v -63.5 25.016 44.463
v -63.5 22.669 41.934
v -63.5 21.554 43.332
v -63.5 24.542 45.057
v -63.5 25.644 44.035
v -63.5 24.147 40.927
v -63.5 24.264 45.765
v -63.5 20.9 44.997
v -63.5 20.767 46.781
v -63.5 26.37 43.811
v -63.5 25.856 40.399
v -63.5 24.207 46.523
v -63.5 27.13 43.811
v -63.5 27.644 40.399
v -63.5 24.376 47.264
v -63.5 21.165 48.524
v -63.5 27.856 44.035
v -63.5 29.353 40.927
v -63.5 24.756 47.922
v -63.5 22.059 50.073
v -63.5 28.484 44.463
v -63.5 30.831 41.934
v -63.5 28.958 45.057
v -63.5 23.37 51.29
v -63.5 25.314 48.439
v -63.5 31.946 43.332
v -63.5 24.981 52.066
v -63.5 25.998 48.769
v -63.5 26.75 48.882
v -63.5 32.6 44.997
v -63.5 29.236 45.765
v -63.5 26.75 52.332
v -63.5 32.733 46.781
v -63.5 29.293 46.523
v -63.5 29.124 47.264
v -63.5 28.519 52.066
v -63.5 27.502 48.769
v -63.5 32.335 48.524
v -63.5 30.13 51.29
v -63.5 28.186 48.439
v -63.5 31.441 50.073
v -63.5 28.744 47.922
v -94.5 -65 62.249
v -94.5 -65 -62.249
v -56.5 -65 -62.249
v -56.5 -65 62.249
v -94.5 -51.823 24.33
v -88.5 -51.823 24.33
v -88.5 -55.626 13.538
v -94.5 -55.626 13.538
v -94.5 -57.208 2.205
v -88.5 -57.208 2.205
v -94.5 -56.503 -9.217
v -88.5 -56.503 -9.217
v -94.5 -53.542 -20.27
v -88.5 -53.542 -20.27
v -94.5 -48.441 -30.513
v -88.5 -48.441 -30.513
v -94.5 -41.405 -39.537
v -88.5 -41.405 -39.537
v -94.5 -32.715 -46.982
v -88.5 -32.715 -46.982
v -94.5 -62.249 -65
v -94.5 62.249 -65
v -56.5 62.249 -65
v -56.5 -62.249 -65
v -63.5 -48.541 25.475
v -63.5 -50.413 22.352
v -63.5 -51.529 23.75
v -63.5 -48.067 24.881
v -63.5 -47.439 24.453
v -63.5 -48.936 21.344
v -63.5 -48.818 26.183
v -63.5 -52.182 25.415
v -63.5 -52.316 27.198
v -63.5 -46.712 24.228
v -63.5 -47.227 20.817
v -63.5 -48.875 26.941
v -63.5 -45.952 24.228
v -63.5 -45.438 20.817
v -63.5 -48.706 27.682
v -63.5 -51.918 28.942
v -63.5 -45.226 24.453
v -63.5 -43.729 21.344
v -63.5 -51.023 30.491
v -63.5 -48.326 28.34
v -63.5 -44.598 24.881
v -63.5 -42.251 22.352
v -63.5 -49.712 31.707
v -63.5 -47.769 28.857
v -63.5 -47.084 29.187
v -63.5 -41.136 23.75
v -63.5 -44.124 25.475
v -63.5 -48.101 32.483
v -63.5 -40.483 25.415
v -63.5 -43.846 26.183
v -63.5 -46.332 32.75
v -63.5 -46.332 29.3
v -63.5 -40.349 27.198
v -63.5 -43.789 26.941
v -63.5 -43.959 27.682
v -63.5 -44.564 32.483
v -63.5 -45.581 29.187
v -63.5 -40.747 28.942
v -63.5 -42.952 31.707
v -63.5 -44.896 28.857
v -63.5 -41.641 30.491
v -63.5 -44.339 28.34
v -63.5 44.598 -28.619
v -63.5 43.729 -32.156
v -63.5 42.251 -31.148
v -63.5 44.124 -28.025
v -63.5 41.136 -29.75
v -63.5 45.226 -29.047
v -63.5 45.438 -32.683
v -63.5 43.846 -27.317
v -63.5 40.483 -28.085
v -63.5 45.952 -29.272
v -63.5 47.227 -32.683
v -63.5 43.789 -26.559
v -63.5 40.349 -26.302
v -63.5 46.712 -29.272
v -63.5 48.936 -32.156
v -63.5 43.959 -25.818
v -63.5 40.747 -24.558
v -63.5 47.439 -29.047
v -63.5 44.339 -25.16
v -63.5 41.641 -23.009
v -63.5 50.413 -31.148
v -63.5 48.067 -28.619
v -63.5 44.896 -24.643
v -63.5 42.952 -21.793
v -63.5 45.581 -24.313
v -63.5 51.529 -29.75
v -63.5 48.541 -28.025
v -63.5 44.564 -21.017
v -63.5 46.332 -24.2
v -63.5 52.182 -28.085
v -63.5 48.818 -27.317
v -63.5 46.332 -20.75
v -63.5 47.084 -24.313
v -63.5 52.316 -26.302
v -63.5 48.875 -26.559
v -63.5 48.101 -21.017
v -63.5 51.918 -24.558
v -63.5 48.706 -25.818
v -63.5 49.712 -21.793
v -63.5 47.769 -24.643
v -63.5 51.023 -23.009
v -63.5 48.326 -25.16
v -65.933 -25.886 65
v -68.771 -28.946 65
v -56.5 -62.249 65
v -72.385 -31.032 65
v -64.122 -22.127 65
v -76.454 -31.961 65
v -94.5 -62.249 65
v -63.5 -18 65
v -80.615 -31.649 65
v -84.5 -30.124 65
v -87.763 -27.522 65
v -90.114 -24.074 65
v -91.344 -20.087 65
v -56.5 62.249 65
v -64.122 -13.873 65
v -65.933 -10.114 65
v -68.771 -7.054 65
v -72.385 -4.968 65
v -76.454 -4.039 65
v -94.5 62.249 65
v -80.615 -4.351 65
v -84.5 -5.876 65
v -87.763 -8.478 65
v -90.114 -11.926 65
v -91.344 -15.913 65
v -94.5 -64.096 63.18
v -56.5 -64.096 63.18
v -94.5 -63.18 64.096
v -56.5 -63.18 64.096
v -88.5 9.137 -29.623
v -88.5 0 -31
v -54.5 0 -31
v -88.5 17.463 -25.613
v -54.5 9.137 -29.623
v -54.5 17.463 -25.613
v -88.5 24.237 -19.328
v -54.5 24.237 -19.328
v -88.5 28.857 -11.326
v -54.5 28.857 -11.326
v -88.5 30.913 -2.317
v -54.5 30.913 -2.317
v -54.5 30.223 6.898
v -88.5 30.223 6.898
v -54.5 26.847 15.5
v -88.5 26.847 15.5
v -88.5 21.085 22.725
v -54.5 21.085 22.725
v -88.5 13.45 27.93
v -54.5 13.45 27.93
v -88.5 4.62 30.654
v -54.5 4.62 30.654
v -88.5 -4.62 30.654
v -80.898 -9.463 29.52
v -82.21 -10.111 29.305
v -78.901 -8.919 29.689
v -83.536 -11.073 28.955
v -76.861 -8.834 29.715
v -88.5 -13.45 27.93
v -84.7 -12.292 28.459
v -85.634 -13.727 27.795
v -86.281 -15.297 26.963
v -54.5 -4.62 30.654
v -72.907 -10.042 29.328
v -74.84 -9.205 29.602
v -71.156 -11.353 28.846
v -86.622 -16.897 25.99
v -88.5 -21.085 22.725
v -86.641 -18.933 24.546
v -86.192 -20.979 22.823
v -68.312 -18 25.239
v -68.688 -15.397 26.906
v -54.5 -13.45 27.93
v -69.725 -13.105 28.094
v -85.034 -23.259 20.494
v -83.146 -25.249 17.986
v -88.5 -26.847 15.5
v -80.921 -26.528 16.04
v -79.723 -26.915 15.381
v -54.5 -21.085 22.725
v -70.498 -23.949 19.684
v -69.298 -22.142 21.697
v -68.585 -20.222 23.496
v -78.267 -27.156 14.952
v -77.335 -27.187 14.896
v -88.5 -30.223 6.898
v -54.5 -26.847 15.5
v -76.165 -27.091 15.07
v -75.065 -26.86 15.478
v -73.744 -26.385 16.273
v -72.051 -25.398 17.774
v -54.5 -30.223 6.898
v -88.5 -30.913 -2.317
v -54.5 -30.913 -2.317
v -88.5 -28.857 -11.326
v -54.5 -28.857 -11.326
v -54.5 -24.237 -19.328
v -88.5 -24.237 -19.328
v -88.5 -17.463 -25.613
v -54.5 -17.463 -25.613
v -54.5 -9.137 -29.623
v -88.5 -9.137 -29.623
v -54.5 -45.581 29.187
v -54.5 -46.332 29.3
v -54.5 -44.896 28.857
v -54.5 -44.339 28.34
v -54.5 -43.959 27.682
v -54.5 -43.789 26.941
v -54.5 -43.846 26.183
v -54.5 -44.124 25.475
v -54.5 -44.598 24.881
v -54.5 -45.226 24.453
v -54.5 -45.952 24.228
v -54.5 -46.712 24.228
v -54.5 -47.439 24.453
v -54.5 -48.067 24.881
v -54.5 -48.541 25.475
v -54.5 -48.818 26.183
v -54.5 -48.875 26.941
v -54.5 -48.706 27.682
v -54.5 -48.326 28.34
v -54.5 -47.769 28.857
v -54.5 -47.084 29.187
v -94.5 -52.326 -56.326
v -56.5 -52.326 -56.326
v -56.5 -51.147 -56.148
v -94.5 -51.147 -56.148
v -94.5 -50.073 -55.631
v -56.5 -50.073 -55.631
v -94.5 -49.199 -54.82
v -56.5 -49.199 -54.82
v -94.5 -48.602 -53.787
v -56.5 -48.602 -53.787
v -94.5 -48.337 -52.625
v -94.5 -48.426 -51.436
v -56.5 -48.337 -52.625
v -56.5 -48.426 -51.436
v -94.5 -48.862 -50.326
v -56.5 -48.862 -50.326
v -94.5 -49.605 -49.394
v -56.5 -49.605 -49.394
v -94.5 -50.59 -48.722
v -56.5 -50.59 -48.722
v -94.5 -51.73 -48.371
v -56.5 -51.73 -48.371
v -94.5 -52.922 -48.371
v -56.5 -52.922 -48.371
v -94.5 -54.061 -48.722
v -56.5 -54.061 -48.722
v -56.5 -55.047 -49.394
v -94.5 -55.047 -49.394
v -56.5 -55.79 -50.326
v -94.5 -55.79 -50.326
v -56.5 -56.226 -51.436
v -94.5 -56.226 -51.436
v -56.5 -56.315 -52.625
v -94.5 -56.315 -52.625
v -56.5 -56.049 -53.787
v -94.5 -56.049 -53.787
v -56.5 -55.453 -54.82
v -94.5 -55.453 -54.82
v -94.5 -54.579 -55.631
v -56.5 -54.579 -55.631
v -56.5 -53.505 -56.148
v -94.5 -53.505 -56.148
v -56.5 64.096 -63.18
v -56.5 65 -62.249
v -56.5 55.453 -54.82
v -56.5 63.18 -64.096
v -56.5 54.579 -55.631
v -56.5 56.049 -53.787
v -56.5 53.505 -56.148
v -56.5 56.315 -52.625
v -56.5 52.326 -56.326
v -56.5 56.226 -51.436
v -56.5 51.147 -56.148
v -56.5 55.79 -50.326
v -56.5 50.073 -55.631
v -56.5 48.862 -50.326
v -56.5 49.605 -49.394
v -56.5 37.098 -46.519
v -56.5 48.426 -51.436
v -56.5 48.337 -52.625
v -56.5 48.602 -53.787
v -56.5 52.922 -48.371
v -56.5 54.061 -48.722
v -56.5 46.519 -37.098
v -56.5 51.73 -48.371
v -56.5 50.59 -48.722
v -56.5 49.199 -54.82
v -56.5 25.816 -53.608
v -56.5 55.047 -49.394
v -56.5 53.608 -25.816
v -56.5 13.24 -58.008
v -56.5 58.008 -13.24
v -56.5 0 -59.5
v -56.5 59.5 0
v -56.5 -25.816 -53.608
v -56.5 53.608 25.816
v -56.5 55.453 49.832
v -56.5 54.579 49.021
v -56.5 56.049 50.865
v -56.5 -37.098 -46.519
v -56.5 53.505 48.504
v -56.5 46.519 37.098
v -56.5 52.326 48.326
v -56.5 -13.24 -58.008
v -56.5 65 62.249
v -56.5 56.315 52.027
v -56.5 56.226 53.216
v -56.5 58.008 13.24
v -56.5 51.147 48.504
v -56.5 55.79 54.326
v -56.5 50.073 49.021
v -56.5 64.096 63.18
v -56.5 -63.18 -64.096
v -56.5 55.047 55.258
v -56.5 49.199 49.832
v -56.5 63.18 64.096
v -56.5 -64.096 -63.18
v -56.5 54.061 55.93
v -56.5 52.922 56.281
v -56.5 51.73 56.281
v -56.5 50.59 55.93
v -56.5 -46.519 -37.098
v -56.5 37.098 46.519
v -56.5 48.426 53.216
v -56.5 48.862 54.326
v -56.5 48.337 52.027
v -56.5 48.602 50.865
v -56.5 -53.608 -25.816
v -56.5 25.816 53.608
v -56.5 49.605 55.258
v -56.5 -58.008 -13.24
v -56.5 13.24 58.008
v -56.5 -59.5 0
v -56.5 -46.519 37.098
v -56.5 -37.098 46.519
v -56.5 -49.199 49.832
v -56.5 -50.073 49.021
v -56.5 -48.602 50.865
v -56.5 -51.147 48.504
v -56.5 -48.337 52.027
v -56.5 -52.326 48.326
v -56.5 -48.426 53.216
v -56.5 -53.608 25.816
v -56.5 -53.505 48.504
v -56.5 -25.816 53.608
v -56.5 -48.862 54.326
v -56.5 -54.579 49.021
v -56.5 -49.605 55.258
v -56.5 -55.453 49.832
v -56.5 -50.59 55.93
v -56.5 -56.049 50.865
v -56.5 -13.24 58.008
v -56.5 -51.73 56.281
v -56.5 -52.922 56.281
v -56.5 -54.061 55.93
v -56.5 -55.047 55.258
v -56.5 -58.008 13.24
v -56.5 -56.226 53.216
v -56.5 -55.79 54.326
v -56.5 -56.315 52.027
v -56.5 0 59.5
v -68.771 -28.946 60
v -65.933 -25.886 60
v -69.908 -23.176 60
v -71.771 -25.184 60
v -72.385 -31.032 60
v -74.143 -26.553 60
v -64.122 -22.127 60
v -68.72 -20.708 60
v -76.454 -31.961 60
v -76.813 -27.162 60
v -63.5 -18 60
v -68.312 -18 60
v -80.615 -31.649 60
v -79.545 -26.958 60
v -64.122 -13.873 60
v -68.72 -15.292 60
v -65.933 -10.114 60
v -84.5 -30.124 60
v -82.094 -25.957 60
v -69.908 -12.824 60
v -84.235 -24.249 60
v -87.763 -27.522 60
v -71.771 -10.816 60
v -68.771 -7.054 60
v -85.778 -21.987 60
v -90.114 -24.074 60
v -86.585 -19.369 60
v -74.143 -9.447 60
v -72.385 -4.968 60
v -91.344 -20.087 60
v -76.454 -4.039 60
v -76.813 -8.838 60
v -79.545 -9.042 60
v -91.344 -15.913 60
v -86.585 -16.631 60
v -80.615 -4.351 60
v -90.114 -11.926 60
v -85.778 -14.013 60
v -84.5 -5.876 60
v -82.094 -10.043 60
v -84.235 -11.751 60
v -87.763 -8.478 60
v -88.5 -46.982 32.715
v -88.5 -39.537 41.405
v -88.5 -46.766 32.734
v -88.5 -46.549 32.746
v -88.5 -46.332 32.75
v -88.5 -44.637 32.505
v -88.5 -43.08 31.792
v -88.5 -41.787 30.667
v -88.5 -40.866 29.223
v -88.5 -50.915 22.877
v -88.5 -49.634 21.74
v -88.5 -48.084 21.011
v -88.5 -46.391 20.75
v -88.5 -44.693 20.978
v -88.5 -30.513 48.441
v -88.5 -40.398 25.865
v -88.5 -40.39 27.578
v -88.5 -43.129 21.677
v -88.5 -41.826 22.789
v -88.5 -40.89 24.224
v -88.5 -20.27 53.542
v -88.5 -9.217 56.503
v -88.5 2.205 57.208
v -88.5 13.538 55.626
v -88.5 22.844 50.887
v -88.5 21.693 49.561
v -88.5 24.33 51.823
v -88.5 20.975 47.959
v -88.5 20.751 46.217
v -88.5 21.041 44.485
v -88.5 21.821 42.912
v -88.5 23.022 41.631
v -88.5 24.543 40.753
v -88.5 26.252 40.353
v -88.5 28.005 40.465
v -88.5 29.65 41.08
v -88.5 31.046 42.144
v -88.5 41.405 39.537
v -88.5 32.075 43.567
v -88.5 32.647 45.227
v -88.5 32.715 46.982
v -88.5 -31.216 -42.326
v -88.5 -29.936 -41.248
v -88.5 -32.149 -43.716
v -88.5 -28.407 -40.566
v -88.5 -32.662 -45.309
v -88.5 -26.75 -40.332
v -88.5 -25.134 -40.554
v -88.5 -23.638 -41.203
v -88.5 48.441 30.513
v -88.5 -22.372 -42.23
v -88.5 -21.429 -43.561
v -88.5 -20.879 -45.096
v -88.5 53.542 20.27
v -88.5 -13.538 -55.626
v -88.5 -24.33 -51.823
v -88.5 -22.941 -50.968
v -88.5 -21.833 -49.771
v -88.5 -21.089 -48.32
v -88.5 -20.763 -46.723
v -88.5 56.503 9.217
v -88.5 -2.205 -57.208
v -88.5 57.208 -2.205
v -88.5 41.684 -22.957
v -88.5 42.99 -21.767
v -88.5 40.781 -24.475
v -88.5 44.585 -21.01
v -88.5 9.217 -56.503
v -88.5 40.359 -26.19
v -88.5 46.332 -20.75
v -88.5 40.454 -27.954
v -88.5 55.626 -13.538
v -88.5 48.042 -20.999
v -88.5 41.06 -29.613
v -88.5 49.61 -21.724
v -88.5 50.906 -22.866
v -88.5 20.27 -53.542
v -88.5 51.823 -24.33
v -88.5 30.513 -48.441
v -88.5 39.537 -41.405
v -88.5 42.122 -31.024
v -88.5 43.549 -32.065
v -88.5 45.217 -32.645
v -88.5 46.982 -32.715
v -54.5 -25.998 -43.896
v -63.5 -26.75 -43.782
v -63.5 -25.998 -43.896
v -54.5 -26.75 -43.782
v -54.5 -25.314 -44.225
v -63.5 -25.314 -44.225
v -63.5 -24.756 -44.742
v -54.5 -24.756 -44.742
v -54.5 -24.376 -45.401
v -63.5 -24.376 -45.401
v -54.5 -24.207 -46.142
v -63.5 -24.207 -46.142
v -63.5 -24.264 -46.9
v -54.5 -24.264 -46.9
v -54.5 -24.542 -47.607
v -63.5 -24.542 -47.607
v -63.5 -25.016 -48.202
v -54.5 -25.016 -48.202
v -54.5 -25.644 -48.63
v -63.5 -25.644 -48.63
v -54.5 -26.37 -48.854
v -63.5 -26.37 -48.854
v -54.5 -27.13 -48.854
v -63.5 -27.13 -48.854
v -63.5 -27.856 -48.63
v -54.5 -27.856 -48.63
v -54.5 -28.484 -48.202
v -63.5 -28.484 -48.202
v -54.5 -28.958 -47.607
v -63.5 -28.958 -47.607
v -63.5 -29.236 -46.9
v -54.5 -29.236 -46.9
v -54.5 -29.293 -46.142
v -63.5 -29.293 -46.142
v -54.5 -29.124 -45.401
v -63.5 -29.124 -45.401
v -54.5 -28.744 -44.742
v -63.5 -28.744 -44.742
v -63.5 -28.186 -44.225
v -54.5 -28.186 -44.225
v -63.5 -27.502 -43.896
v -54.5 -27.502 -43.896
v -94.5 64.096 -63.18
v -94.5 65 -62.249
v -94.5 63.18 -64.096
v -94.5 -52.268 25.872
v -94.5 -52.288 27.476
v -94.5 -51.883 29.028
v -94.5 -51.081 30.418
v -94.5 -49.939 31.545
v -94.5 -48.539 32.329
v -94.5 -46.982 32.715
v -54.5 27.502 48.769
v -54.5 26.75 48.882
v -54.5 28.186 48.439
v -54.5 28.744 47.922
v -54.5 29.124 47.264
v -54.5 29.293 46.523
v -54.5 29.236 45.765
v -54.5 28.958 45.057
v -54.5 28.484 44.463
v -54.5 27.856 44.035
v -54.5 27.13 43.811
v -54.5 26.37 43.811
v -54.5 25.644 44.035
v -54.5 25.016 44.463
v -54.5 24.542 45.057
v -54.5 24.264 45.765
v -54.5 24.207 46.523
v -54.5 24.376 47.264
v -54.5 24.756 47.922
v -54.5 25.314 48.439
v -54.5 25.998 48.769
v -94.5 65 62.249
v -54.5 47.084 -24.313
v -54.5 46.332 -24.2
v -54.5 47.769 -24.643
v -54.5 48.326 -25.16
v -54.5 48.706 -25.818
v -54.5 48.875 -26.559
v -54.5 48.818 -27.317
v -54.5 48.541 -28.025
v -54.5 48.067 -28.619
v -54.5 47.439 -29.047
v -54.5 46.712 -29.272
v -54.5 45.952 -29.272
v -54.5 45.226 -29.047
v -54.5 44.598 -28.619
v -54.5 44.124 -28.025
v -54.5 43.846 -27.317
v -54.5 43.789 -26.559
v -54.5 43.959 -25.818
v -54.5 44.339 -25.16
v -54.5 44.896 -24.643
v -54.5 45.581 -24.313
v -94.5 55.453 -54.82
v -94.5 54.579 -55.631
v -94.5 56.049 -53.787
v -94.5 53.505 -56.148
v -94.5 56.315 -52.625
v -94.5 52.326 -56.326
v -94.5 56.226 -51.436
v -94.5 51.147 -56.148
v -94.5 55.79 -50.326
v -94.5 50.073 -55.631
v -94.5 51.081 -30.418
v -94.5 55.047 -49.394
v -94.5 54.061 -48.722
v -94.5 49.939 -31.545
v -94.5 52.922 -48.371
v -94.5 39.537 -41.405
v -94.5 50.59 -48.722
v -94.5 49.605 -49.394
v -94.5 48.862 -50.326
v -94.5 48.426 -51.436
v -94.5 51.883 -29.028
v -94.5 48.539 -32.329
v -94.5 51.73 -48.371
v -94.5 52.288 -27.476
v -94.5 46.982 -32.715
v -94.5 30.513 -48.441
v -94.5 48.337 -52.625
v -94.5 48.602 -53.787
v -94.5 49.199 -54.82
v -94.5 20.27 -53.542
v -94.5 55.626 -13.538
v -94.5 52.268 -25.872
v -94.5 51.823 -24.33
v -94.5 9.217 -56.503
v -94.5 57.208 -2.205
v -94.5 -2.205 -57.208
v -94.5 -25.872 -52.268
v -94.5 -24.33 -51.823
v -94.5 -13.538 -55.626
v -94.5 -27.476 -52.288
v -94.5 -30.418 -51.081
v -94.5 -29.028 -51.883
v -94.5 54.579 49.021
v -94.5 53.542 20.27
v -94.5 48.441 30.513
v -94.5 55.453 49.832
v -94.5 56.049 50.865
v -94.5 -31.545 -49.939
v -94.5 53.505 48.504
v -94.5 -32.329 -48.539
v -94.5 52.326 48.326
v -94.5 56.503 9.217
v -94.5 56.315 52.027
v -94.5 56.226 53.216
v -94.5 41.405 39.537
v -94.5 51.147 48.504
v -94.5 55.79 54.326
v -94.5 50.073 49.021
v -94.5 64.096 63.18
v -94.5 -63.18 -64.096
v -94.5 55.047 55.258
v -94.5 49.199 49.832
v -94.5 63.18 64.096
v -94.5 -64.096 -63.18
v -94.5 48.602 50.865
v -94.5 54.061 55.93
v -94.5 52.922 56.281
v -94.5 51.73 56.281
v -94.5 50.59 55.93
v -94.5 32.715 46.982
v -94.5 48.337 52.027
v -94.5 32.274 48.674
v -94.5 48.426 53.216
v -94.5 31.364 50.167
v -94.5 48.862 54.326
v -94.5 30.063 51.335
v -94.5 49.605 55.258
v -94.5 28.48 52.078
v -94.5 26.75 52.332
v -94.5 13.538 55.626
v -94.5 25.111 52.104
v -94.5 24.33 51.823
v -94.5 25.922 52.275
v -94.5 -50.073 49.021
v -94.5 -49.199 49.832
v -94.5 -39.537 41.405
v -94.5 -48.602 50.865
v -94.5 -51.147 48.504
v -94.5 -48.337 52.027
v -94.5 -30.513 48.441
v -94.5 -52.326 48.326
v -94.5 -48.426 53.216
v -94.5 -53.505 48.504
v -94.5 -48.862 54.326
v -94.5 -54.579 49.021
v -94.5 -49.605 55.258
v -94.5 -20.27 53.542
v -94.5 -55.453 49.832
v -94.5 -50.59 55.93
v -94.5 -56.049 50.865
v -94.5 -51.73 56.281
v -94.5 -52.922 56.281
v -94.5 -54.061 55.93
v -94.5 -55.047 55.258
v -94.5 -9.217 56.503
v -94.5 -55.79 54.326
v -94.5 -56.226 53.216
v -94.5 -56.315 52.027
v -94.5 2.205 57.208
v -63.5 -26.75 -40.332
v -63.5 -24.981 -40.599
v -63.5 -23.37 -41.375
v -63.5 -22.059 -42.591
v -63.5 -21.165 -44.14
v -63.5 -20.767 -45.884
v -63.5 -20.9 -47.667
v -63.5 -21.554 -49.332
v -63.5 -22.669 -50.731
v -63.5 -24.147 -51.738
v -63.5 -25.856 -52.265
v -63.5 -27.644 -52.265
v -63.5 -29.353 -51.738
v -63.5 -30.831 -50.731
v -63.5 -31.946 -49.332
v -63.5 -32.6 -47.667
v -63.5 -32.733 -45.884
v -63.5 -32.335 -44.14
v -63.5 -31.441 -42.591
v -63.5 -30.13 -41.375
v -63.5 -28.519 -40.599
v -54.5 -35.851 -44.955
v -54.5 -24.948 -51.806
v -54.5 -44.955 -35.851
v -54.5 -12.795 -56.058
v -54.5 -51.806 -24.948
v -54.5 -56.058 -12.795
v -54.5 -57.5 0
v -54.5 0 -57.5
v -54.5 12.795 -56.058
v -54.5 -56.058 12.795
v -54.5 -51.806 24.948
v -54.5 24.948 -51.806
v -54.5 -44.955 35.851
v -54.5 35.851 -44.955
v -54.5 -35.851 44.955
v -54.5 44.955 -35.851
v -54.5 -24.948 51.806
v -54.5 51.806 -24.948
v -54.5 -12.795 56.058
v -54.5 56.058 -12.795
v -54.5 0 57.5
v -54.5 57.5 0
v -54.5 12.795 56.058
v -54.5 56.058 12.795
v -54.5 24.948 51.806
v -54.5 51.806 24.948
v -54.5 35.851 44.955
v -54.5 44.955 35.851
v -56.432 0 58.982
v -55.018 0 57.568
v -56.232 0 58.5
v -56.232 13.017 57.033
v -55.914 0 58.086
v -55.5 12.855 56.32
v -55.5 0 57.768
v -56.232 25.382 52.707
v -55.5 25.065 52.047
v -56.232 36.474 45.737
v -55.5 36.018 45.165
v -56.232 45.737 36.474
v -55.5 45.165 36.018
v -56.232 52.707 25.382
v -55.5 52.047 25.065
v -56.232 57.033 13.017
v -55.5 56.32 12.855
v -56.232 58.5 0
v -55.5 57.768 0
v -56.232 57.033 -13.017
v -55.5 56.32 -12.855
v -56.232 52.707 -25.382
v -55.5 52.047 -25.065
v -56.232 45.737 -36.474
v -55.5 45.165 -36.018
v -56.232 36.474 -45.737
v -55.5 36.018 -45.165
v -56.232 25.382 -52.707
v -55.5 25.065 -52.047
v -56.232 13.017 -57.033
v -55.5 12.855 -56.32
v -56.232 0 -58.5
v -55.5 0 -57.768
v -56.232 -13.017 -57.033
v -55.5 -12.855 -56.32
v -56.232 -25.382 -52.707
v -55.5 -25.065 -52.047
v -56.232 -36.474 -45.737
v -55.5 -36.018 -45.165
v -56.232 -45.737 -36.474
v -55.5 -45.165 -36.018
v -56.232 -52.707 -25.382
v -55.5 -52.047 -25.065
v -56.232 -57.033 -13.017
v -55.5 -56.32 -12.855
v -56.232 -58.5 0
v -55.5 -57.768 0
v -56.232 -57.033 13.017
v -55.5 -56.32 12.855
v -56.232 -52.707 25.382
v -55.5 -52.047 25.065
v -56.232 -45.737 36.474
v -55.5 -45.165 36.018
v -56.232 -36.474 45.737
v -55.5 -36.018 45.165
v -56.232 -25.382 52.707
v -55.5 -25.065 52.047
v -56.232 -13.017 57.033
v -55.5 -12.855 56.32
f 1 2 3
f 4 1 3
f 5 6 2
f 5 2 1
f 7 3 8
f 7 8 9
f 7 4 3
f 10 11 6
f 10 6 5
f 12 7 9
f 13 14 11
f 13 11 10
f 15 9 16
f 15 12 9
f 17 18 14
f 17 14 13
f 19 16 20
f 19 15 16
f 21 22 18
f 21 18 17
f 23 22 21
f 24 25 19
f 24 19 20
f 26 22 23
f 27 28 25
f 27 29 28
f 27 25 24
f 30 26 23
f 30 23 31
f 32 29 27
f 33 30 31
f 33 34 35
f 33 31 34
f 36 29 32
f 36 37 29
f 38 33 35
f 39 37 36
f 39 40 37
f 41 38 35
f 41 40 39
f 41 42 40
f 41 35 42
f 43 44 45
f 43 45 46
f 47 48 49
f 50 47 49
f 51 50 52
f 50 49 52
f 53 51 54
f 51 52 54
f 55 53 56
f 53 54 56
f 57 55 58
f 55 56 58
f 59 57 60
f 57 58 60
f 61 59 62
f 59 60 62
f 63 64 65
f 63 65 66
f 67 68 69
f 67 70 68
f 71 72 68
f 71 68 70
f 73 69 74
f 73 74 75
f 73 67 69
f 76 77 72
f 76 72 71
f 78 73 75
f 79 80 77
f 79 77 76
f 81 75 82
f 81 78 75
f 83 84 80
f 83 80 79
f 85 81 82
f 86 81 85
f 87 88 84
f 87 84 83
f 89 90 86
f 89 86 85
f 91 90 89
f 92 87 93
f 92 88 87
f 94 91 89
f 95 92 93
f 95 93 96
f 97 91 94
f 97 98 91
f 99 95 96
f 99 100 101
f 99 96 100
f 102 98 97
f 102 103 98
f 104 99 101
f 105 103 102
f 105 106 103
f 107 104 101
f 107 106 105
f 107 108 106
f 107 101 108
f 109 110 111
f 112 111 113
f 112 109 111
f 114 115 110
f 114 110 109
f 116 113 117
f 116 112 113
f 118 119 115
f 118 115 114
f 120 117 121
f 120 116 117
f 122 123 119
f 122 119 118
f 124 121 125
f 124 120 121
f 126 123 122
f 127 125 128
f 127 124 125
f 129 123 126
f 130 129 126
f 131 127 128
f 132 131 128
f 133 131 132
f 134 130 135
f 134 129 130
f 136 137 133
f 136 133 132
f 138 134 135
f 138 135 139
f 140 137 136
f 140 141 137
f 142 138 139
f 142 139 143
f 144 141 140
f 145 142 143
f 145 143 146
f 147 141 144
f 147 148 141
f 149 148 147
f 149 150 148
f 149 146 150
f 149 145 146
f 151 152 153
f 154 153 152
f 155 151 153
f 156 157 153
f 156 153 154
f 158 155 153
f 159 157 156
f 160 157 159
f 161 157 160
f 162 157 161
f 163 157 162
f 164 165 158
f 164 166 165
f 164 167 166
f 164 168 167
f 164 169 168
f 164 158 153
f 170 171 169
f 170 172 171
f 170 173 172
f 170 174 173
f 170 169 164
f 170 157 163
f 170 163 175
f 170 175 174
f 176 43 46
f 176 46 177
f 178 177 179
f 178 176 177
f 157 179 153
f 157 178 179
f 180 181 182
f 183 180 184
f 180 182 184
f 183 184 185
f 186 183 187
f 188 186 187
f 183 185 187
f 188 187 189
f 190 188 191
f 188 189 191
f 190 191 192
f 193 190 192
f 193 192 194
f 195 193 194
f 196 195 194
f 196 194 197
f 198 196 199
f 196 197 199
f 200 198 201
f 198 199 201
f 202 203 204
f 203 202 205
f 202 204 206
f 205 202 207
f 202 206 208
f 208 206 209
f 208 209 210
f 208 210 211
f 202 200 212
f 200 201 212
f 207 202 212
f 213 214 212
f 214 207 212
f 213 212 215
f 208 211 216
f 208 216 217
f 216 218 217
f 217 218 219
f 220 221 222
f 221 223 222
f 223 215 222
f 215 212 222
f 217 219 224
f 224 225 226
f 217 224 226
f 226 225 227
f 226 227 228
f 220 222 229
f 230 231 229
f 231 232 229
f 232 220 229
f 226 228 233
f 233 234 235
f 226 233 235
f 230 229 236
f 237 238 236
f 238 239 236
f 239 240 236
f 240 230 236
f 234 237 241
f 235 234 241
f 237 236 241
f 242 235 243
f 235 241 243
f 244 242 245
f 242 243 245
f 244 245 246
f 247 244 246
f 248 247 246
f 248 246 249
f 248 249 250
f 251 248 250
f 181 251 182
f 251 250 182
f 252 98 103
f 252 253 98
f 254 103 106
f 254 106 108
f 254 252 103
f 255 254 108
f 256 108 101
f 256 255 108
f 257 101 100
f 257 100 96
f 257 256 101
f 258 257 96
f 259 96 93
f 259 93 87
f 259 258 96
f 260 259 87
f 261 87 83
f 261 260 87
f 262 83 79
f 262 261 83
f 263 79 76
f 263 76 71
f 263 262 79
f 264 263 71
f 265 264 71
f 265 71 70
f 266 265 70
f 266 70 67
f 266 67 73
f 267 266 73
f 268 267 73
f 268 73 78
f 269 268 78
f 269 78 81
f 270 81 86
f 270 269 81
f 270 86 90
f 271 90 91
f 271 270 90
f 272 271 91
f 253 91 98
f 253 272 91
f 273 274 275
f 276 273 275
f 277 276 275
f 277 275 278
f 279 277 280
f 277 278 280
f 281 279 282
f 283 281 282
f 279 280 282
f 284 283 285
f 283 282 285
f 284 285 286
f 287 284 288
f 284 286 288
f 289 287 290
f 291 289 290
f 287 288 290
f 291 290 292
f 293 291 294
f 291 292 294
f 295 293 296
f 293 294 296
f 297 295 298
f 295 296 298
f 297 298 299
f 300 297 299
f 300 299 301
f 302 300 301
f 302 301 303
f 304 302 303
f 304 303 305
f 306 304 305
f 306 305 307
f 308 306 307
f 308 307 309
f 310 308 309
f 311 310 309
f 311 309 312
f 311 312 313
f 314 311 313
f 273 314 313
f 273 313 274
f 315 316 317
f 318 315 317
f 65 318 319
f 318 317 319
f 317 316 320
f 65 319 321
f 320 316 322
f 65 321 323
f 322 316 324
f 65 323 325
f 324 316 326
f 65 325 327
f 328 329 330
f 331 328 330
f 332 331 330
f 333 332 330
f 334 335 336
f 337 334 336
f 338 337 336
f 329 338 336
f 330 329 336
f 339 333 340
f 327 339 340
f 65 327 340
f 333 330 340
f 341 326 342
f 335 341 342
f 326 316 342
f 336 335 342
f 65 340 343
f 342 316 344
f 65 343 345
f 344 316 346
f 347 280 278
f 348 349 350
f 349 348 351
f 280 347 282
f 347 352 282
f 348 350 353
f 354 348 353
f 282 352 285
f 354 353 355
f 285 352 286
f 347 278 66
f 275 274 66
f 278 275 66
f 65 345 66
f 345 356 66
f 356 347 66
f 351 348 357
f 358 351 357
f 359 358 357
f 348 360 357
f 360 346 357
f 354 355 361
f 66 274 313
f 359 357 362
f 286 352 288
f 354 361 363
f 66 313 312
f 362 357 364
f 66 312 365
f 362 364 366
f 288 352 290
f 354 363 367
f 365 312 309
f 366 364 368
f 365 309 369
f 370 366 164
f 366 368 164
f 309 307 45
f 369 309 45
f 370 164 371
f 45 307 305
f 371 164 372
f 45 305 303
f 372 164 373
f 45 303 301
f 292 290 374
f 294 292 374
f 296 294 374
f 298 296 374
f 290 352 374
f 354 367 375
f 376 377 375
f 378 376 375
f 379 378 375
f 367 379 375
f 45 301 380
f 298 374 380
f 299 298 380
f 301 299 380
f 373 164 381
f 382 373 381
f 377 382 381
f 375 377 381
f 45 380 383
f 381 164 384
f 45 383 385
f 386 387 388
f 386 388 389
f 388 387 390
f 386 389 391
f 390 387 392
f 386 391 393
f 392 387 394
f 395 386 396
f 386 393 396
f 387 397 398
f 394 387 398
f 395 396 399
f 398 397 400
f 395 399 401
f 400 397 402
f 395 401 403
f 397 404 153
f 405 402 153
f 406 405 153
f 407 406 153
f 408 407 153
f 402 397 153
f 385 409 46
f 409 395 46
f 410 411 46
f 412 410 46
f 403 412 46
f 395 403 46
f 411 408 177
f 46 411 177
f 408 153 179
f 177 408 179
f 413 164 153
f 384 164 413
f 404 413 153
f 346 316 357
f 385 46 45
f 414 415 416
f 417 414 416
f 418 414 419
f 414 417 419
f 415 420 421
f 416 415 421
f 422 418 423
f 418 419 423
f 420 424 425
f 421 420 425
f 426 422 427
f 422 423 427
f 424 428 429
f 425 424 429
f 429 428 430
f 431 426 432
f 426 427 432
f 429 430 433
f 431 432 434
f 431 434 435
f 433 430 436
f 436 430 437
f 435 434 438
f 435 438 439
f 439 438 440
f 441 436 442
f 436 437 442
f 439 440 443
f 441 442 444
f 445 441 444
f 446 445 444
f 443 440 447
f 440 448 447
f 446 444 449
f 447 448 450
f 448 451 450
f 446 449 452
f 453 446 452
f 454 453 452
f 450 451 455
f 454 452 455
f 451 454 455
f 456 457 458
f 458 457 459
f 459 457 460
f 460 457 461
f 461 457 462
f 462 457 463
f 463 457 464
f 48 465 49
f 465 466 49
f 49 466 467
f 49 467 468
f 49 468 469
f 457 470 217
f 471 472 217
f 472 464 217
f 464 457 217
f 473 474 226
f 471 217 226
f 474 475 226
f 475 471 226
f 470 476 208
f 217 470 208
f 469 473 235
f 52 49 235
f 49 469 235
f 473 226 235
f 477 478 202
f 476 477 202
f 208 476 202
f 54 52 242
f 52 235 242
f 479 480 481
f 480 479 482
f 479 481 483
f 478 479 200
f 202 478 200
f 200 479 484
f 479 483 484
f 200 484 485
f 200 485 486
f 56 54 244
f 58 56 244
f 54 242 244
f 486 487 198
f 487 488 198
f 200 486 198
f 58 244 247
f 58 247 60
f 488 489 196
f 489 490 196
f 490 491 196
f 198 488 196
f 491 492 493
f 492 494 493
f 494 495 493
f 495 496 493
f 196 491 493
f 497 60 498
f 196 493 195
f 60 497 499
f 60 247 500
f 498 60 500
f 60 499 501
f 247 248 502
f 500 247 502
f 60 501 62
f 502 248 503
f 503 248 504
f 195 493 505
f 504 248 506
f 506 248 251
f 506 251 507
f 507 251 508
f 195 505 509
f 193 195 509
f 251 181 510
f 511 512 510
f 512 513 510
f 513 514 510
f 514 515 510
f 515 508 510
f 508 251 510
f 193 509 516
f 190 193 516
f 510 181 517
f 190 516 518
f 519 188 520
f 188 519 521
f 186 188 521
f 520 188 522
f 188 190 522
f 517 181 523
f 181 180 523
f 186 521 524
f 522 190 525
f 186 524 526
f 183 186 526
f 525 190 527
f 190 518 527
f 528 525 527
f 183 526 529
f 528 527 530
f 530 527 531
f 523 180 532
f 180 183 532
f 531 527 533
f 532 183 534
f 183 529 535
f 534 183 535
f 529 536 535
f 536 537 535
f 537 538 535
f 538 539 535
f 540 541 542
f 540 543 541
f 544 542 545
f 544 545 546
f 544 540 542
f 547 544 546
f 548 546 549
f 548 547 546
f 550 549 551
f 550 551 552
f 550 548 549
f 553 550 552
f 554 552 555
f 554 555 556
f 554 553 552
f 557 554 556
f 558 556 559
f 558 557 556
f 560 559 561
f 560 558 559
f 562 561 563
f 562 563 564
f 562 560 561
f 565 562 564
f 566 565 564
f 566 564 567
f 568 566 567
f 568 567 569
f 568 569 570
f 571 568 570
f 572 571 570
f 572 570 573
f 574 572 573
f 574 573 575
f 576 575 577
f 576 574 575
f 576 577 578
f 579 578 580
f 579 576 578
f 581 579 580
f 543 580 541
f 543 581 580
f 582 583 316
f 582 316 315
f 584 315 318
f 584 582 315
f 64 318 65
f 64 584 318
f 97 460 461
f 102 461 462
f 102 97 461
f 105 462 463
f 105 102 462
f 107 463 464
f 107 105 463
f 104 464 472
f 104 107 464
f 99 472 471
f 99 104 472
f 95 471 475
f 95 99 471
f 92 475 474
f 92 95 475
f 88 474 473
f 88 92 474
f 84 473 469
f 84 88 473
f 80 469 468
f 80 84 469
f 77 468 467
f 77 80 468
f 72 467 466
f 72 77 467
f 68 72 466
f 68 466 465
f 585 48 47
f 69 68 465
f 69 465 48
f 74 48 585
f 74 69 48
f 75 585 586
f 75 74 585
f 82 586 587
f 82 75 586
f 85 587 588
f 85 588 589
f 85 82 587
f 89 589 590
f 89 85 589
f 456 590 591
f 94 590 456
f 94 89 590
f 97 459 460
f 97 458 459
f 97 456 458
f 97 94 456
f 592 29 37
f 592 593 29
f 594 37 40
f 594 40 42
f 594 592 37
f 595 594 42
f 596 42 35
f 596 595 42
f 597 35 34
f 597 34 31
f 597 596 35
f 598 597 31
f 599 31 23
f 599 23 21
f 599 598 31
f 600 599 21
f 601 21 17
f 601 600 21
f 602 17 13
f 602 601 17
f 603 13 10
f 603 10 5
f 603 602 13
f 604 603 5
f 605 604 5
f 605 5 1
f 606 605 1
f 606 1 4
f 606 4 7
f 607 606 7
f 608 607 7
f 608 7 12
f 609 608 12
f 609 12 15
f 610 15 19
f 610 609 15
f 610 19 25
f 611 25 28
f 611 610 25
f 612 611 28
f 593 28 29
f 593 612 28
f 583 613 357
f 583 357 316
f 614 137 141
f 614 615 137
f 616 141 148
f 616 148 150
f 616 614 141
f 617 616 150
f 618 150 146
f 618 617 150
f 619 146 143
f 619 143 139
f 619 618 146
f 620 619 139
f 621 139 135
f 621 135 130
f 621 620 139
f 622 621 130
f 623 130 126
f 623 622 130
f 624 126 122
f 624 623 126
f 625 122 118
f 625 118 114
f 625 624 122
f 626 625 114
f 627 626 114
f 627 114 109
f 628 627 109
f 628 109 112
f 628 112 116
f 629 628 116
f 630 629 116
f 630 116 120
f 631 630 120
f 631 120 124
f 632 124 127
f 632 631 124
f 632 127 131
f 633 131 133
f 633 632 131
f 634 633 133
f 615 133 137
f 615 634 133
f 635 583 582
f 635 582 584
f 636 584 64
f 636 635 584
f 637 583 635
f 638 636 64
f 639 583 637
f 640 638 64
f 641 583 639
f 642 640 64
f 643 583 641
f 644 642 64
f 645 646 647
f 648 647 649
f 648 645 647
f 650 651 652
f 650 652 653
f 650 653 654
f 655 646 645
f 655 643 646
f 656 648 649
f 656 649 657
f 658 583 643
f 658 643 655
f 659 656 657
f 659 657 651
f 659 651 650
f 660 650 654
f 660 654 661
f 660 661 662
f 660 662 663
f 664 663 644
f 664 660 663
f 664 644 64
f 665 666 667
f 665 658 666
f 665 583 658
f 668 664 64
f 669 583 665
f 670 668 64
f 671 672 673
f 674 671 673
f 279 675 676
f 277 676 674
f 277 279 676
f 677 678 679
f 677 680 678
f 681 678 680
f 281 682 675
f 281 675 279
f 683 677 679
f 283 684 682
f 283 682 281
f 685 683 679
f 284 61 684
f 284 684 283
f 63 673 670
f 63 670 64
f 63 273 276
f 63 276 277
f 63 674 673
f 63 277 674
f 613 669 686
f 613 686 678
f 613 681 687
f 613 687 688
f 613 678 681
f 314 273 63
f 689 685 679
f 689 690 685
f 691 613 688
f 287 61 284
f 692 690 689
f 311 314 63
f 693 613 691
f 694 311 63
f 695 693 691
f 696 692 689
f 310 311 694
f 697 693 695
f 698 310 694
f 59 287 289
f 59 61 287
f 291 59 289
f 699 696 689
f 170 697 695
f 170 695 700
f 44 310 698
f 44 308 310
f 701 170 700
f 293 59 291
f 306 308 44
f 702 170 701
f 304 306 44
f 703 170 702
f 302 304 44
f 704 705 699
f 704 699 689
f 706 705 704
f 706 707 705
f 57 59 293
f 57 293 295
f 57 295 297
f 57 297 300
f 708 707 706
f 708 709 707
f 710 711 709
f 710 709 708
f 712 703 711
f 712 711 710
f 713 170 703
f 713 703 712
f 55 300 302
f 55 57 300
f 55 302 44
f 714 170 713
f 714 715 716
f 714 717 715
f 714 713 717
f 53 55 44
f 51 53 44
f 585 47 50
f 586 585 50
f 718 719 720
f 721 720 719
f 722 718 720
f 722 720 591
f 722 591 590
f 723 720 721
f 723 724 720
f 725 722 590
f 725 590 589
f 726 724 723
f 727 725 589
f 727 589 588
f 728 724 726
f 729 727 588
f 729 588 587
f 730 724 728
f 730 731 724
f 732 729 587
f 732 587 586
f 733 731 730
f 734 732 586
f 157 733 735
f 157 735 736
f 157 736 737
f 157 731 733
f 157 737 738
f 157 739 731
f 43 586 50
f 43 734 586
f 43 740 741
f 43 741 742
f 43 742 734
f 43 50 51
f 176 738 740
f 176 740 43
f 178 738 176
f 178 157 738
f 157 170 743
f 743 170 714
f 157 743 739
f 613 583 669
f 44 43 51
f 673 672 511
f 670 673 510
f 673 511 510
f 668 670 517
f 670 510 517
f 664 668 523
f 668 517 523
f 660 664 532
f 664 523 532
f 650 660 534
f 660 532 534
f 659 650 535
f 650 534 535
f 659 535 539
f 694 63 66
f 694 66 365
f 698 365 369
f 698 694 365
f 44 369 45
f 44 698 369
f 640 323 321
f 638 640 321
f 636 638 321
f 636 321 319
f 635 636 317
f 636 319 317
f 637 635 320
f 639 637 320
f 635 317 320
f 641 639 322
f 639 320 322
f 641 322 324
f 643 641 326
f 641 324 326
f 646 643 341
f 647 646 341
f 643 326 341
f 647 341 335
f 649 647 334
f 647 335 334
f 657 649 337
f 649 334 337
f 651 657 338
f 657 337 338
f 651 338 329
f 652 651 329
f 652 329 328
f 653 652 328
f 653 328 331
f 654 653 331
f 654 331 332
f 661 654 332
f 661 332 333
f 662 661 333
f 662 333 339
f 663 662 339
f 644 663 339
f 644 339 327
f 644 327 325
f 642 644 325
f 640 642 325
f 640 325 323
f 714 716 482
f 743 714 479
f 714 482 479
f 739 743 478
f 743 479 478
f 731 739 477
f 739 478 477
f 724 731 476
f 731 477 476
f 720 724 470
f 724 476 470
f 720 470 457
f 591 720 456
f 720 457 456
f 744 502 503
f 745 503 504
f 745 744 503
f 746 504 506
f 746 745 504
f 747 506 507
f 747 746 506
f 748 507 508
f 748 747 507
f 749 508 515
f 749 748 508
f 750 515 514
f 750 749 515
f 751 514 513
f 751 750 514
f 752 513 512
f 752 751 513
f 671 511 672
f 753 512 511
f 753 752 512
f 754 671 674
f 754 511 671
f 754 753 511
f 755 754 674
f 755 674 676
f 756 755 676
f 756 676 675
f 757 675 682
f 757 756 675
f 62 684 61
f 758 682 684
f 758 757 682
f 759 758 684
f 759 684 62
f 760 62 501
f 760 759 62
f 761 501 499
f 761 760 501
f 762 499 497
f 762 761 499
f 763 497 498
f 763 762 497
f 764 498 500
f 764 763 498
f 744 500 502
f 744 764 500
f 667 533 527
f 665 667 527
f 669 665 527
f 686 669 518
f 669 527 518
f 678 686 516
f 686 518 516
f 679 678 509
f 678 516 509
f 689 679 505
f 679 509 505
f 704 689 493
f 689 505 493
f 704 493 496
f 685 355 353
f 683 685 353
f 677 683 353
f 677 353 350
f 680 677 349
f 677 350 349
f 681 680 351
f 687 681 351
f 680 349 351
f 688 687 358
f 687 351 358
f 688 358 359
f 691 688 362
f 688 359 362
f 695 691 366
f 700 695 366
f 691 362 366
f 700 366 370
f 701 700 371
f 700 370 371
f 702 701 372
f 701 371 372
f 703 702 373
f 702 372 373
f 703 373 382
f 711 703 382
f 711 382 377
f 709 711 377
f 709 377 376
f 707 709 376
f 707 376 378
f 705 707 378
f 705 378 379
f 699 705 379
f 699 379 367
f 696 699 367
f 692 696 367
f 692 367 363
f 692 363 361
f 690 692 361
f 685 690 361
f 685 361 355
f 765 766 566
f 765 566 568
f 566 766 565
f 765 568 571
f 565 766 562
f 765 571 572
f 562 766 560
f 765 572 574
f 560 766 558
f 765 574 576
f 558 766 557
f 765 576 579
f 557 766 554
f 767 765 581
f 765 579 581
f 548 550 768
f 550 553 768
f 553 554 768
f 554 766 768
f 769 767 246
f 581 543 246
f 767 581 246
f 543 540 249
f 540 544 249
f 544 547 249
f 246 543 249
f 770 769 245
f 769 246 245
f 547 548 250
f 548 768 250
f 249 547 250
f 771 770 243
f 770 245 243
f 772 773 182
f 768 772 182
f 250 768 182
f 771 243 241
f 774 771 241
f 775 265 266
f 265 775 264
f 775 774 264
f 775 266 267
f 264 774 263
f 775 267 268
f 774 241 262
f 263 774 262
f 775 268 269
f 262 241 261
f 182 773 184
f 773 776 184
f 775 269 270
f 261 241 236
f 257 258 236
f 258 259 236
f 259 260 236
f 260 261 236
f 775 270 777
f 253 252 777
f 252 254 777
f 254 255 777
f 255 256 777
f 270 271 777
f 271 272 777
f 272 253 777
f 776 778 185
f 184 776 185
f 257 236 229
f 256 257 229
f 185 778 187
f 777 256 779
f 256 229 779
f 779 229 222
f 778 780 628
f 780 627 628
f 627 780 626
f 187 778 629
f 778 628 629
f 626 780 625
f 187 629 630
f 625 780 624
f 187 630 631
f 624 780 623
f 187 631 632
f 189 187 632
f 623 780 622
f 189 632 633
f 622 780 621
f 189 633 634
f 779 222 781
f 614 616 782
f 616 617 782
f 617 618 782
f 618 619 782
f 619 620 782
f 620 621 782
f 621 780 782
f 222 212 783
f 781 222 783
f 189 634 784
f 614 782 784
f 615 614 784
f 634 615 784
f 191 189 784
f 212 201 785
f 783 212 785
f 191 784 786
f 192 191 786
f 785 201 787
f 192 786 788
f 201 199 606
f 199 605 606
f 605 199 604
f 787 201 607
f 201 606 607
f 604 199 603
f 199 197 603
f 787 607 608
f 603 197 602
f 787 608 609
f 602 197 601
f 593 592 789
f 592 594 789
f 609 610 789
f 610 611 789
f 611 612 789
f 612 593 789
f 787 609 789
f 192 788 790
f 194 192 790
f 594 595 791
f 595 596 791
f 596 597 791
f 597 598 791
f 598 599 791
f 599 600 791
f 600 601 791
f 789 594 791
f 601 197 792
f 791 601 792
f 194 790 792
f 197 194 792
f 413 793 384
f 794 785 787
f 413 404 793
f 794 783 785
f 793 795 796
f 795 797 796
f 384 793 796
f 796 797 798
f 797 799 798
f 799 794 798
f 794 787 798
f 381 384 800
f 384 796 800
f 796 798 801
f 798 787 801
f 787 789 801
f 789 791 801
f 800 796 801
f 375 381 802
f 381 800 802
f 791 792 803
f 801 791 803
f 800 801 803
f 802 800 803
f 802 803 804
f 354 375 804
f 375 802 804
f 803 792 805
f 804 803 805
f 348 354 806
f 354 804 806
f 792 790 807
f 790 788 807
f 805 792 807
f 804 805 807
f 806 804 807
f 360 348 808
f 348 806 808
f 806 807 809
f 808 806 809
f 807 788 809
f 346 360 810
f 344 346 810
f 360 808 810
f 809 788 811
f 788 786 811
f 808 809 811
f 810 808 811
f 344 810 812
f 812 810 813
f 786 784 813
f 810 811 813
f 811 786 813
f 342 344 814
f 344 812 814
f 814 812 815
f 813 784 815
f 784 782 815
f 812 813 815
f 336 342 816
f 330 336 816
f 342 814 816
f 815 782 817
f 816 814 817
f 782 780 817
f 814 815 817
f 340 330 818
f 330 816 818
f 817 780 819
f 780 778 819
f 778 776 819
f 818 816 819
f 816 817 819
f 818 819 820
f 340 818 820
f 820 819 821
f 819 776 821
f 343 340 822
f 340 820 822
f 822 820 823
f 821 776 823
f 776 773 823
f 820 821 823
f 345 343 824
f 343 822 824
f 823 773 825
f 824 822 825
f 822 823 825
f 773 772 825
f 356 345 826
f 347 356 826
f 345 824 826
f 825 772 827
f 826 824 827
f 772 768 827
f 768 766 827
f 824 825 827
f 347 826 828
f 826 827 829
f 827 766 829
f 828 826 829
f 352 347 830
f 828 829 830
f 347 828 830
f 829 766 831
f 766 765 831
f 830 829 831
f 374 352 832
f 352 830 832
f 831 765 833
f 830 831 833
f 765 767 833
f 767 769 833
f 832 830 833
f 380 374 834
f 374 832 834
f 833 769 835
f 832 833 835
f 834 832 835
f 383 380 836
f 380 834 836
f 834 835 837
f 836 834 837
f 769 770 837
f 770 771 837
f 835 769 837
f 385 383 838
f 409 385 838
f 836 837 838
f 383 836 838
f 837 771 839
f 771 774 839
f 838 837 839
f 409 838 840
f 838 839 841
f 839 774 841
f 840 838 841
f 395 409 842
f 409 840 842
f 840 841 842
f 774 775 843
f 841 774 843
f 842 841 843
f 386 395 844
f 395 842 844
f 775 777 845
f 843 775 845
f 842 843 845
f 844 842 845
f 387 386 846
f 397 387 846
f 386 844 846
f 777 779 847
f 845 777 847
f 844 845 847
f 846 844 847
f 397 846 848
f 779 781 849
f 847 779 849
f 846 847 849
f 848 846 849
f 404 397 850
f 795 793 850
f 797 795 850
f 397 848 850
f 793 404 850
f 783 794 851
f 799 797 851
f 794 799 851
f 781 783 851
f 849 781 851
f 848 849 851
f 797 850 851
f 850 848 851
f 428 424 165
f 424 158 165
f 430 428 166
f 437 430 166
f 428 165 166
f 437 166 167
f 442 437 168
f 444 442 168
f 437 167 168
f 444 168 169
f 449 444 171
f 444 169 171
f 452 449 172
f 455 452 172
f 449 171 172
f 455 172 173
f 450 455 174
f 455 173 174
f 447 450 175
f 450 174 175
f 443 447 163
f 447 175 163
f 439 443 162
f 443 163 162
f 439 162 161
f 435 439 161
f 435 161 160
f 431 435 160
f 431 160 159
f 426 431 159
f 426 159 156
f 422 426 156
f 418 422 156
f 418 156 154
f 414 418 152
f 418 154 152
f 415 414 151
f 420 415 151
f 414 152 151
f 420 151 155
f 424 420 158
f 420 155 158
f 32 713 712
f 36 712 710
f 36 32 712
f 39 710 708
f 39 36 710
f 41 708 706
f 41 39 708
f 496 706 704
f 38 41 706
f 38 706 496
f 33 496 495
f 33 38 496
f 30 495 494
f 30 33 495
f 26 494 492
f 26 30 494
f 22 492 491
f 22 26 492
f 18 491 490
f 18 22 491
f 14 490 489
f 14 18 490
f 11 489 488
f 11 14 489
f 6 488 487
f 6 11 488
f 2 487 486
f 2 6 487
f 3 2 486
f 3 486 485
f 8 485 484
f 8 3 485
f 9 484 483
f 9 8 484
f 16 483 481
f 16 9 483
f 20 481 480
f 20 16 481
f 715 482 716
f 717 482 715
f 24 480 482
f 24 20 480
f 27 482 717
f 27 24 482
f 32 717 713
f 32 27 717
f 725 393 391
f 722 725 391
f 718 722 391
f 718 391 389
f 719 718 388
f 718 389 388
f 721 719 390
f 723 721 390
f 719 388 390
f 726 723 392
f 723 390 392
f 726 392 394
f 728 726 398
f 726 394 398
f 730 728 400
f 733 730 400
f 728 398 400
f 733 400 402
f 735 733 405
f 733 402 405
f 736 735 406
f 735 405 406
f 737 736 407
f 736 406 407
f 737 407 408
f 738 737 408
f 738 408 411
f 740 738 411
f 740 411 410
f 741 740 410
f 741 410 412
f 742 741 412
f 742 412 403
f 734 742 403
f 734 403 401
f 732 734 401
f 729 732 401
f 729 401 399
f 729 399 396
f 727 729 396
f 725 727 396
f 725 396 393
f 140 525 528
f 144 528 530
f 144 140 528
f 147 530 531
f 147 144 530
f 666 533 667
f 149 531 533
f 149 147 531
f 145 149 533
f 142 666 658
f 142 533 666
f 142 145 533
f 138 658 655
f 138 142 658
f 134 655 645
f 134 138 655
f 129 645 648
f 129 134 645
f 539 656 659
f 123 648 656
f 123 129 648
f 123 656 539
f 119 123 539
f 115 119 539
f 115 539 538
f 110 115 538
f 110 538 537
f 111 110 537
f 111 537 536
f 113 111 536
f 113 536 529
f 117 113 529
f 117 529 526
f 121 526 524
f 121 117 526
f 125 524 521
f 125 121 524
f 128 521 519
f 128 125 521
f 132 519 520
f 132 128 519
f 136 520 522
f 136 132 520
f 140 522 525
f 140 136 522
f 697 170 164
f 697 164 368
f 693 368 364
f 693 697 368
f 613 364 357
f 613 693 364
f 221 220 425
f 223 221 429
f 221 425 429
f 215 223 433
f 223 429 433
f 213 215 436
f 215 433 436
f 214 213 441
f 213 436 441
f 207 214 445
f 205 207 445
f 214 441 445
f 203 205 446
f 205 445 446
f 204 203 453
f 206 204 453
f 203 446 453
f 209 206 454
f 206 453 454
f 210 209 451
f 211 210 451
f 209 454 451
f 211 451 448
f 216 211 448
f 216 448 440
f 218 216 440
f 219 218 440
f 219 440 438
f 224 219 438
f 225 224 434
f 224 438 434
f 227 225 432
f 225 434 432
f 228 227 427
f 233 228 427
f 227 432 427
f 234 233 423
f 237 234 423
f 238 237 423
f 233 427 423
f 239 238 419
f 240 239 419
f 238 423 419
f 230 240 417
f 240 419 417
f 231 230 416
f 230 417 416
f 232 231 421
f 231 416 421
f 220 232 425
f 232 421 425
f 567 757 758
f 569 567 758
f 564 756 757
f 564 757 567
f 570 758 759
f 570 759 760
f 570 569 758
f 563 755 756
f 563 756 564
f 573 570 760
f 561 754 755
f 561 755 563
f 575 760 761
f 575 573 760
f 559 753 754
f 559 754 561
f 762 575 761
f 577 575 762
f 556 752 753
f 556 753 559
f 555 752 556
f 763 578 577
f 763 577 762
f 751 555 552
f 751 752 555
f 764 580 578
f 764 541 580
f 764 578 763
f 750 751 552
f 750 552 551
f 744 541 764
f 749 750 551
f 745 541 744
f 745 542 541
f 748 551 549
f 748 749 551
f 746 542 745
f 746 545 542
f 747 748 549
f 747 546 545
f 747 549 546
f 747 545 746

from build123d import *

# Parameters (mm, degrees)
SALIENTE_EXTRUIR1_DEPTH            = 38
TALADRO_DE_MARGEN_PARA_M1001_D     = 114.5
TALADRO_DE_MARGEN_PARA_M1001_DEPTH = 6
CROQUIS9_W                         = 34
CROQUIS9_H                         = 31
TALADRO_DE_MARGEN_PARA_M71_D       = 8


# Read off the part's stored shape, not the designer's step: Refrentado para perno con cabeza hexagonal de M161
with BuildPart() as part:
    # Croquis1 → Saliente-Extruir1 (new body)
    with BuildSketch(Plane(origin=(-94.5, 0, 0), x_dir=(0, -1, 0), z_dir=(-1, 0, 0))):
        with BuildLine():
            Line((62.24949799, 65), (-62.24949799, 65))
            ThreePointArc((-62.24949799, 65), (-63.639610307, 63.639610307), (-65, 62.24949799))
            Line((-65, 62.24949799), (-65, -62.24949799))
            ThreePointArc((-65, -62.24949799), (-63.639610307, -63.639610307), (-62.24949799, -65))
            Line((-62.24949799, -65), (62.24949799, -65))
            ThreePointArc((62.24949799, -65), (63.639610307, -63.639610307), (65, -62.24949799))
            Line((65, -62.24949799), (65, 62.24949799))
            ThreePointArc((65, 62.24949799), (63.639610307, 63.639610307), (62.24949799, 65))
        make_face()
    extrude(amount=-SALIENTE_EXTRUIR1_DEPTH)

    # Taladro de margen para M1001
    with Locations(Plane.ZY.offset(94.5)):
        with Locations((0, 0)):
            Hole(TALADRO_DE_MARGEN_PARA_M1001_D / 2, depth=TALADRO_DE_MARGEN_PARA_M1001_DEPTH)

    # Croquis4 → Revolución1 (revolve)
    with BuildSketch(Plane(origin=(0, 0, 0), x_dir=(-1, 0, 0), z_dir=(0, 0, -1)), mode=Mode.PRIVATE) as revoluci_n1_sk:
        with BuildLine():
            Line((54.5, 57.5), (54.5, 0))
            Line((54.5, 0), (56.5, 0))
            Line((56.5, 0), (56.5, 59.5))
            ThreePointArc((56.5, 59.5), (55.914213562, 58.085786438), (54.5, 57.5))
        make_face()
    revolve(revoluci_n1_sk.sketch.rotate(Axis((-54.499975, 0, 0), (-1, 0, 0)), 270), axis=Axis((-54.499975, 0, 0), (-1, 0, 0)))

    # Croquis5 → Cortar-Revolución1 (revolve, cut)
    with BuildSketch(Plane(origin=(0, 0, 46.3323591), x_dir=(-1, 0, 0), z_dir=(0, 0, -1)), mode=Mode.PRIVATE) as cortar_revoluci_n1_sk:
        Polygon((54.5, 29.3), (54.5, 26.75), (94.5, 26.75), (94.5, 32.75), (63.5, 32.75), (63.5, 29.3), align=None)
    revolve(cortar_revoluci_n1_sk.sketch.rotate(Axis((-54.5, 26.75, 46.3323591), (-1, 0, 0)), 270), axis=Axis((-54.5, 26.75, 46.3323591), (-1, 0, 0)), mode=Mode.SUBTRACT)

    # Croquis6 → Cortar-Revolución2 (revolve, cut)
    with BuildSketch(Plane(origin=(0, 0, -26.75), x_dir=(-1, 0, 0), z_dir=(0, 0, -1)), mode=Mode.PRIVATE) as cortar_revoluci_n2_sk:
        Polygon((54.5, 48.8823591), (54.5, 46.3323591), (94.5, 46.3323591), (94.5, 52.3323591), (63.5, 52.3323591), (63.5, 48.8823591), align=None)
    revolve(cortar_revoluci_n2_sk.sketch.rotate(Axis((-54.5, 46.3323591, -26.75), (-1, 0, 0)), 270), axis=Axis((-54.5, 46.3323591, -26.75), (-1, 0, 0)), mode=Mode.SUBTRACT)

    # Croquis7 → Cortar-Revolución3 (revolve, cut)
    with BuildSketch(Plane(origin=(0, 0, -46.3323591), x_dir=(-1, 0, 0), z_dir=(0, 0, -1)), mode=Mode.PRIVATE) as cortar_revoluci_n3_sk:
        Polygon((54.5, -24.2), (54.5, -26.75), (94.5, -26.75), (94.5, -20.75), (63.5, -20.75), (63.5, -24.2), align=None)
    revolve(cortar_revoluci_n3_sk.sketch.rotate(Axis((-54.5, -26.75, -46.3323591), (-1, 0, 0)), 270), axis=Axis((-54.5, -26.75, -46.3323591), (-1, 0, 0)), mode=Mode.SUBTRACT)

    # Croquis8 → Cortar-Revolución4 (revolve, cut)
    with BuildSketch(Plane(origin=(0, 0, 26.75), x_dir=(-1, 0, 0), z_dir=(0, 0, -1)), mode=Mode.PRIVATE) as cortar_revoluci_n4_sk:
        Polygon((54.5, -43.7823591), (54.5, -46.3323591), (94.5, -46.3323591), (94.5, -40.3323591), (63.5, -40.3323591), (63.5, -43.7823591), align=None)
    revolve(cortar_revoluci_n4_sk.sketch.rotate(Axis((-54.5, -46.3323591, 26.75), (-1, 0, 0)), 270), axis=Axis((-54.5, -46.3323591, 26.75), (-1, 0, 0)), mode=Mode.SUBTRACT)

    # Croquis9 → Cortar-Revolución5 (revolve, cut)
    with BuildSketch(Plane.XY, mode=Mode.PRIVATE) as cortar_revoluci_n5_sk:
        with Locations((-71.5, 15.5)):
            Rectangle(CROQUIS9_W, CROQUIS9_H)
    revolve(cortar_revoluci_n5_sk.sketch.rotate(Axis((-88.5, 0, 0), (1, 0, 0)), 270), axis=Axis((-88.5, 0, 0), (1, 0, 0)), mode=Mode.SUBTRACT)

    # Refrentado para perno con cabeza hex 2 → Refrentado para perno con cabeza hexagonal de M161 (revolve, cut)
    with BuildSketch(Plane(origin=(-77.5, -18, 0), x_dir=(1, 0, 0), z_dir=(0, -1, 0))):
        Polygon((0, 14.891701752), (9.188095, 14.891701752), (9.188095, 60), (14, 60), (14, 65), (0, 65), align=None)
    revolve(axis=Axis((-77.5, -18, 0), (0, 0, 1)), mode=Mode.SUBTRACT)

    # Taladro de margen para M71 (through all)
    with Locations(Plane.ZY.offset(94.5)):
        with Locations((-52.325901808, 52.325901808), (52.325901808, 52.325901808), (52.325901808, -52.325901808), (-52.325901808, -52.325901808)):
            Hole(TALADRO_DE_MARGEN_PARA_M71_D / 2)


solid = part.part
